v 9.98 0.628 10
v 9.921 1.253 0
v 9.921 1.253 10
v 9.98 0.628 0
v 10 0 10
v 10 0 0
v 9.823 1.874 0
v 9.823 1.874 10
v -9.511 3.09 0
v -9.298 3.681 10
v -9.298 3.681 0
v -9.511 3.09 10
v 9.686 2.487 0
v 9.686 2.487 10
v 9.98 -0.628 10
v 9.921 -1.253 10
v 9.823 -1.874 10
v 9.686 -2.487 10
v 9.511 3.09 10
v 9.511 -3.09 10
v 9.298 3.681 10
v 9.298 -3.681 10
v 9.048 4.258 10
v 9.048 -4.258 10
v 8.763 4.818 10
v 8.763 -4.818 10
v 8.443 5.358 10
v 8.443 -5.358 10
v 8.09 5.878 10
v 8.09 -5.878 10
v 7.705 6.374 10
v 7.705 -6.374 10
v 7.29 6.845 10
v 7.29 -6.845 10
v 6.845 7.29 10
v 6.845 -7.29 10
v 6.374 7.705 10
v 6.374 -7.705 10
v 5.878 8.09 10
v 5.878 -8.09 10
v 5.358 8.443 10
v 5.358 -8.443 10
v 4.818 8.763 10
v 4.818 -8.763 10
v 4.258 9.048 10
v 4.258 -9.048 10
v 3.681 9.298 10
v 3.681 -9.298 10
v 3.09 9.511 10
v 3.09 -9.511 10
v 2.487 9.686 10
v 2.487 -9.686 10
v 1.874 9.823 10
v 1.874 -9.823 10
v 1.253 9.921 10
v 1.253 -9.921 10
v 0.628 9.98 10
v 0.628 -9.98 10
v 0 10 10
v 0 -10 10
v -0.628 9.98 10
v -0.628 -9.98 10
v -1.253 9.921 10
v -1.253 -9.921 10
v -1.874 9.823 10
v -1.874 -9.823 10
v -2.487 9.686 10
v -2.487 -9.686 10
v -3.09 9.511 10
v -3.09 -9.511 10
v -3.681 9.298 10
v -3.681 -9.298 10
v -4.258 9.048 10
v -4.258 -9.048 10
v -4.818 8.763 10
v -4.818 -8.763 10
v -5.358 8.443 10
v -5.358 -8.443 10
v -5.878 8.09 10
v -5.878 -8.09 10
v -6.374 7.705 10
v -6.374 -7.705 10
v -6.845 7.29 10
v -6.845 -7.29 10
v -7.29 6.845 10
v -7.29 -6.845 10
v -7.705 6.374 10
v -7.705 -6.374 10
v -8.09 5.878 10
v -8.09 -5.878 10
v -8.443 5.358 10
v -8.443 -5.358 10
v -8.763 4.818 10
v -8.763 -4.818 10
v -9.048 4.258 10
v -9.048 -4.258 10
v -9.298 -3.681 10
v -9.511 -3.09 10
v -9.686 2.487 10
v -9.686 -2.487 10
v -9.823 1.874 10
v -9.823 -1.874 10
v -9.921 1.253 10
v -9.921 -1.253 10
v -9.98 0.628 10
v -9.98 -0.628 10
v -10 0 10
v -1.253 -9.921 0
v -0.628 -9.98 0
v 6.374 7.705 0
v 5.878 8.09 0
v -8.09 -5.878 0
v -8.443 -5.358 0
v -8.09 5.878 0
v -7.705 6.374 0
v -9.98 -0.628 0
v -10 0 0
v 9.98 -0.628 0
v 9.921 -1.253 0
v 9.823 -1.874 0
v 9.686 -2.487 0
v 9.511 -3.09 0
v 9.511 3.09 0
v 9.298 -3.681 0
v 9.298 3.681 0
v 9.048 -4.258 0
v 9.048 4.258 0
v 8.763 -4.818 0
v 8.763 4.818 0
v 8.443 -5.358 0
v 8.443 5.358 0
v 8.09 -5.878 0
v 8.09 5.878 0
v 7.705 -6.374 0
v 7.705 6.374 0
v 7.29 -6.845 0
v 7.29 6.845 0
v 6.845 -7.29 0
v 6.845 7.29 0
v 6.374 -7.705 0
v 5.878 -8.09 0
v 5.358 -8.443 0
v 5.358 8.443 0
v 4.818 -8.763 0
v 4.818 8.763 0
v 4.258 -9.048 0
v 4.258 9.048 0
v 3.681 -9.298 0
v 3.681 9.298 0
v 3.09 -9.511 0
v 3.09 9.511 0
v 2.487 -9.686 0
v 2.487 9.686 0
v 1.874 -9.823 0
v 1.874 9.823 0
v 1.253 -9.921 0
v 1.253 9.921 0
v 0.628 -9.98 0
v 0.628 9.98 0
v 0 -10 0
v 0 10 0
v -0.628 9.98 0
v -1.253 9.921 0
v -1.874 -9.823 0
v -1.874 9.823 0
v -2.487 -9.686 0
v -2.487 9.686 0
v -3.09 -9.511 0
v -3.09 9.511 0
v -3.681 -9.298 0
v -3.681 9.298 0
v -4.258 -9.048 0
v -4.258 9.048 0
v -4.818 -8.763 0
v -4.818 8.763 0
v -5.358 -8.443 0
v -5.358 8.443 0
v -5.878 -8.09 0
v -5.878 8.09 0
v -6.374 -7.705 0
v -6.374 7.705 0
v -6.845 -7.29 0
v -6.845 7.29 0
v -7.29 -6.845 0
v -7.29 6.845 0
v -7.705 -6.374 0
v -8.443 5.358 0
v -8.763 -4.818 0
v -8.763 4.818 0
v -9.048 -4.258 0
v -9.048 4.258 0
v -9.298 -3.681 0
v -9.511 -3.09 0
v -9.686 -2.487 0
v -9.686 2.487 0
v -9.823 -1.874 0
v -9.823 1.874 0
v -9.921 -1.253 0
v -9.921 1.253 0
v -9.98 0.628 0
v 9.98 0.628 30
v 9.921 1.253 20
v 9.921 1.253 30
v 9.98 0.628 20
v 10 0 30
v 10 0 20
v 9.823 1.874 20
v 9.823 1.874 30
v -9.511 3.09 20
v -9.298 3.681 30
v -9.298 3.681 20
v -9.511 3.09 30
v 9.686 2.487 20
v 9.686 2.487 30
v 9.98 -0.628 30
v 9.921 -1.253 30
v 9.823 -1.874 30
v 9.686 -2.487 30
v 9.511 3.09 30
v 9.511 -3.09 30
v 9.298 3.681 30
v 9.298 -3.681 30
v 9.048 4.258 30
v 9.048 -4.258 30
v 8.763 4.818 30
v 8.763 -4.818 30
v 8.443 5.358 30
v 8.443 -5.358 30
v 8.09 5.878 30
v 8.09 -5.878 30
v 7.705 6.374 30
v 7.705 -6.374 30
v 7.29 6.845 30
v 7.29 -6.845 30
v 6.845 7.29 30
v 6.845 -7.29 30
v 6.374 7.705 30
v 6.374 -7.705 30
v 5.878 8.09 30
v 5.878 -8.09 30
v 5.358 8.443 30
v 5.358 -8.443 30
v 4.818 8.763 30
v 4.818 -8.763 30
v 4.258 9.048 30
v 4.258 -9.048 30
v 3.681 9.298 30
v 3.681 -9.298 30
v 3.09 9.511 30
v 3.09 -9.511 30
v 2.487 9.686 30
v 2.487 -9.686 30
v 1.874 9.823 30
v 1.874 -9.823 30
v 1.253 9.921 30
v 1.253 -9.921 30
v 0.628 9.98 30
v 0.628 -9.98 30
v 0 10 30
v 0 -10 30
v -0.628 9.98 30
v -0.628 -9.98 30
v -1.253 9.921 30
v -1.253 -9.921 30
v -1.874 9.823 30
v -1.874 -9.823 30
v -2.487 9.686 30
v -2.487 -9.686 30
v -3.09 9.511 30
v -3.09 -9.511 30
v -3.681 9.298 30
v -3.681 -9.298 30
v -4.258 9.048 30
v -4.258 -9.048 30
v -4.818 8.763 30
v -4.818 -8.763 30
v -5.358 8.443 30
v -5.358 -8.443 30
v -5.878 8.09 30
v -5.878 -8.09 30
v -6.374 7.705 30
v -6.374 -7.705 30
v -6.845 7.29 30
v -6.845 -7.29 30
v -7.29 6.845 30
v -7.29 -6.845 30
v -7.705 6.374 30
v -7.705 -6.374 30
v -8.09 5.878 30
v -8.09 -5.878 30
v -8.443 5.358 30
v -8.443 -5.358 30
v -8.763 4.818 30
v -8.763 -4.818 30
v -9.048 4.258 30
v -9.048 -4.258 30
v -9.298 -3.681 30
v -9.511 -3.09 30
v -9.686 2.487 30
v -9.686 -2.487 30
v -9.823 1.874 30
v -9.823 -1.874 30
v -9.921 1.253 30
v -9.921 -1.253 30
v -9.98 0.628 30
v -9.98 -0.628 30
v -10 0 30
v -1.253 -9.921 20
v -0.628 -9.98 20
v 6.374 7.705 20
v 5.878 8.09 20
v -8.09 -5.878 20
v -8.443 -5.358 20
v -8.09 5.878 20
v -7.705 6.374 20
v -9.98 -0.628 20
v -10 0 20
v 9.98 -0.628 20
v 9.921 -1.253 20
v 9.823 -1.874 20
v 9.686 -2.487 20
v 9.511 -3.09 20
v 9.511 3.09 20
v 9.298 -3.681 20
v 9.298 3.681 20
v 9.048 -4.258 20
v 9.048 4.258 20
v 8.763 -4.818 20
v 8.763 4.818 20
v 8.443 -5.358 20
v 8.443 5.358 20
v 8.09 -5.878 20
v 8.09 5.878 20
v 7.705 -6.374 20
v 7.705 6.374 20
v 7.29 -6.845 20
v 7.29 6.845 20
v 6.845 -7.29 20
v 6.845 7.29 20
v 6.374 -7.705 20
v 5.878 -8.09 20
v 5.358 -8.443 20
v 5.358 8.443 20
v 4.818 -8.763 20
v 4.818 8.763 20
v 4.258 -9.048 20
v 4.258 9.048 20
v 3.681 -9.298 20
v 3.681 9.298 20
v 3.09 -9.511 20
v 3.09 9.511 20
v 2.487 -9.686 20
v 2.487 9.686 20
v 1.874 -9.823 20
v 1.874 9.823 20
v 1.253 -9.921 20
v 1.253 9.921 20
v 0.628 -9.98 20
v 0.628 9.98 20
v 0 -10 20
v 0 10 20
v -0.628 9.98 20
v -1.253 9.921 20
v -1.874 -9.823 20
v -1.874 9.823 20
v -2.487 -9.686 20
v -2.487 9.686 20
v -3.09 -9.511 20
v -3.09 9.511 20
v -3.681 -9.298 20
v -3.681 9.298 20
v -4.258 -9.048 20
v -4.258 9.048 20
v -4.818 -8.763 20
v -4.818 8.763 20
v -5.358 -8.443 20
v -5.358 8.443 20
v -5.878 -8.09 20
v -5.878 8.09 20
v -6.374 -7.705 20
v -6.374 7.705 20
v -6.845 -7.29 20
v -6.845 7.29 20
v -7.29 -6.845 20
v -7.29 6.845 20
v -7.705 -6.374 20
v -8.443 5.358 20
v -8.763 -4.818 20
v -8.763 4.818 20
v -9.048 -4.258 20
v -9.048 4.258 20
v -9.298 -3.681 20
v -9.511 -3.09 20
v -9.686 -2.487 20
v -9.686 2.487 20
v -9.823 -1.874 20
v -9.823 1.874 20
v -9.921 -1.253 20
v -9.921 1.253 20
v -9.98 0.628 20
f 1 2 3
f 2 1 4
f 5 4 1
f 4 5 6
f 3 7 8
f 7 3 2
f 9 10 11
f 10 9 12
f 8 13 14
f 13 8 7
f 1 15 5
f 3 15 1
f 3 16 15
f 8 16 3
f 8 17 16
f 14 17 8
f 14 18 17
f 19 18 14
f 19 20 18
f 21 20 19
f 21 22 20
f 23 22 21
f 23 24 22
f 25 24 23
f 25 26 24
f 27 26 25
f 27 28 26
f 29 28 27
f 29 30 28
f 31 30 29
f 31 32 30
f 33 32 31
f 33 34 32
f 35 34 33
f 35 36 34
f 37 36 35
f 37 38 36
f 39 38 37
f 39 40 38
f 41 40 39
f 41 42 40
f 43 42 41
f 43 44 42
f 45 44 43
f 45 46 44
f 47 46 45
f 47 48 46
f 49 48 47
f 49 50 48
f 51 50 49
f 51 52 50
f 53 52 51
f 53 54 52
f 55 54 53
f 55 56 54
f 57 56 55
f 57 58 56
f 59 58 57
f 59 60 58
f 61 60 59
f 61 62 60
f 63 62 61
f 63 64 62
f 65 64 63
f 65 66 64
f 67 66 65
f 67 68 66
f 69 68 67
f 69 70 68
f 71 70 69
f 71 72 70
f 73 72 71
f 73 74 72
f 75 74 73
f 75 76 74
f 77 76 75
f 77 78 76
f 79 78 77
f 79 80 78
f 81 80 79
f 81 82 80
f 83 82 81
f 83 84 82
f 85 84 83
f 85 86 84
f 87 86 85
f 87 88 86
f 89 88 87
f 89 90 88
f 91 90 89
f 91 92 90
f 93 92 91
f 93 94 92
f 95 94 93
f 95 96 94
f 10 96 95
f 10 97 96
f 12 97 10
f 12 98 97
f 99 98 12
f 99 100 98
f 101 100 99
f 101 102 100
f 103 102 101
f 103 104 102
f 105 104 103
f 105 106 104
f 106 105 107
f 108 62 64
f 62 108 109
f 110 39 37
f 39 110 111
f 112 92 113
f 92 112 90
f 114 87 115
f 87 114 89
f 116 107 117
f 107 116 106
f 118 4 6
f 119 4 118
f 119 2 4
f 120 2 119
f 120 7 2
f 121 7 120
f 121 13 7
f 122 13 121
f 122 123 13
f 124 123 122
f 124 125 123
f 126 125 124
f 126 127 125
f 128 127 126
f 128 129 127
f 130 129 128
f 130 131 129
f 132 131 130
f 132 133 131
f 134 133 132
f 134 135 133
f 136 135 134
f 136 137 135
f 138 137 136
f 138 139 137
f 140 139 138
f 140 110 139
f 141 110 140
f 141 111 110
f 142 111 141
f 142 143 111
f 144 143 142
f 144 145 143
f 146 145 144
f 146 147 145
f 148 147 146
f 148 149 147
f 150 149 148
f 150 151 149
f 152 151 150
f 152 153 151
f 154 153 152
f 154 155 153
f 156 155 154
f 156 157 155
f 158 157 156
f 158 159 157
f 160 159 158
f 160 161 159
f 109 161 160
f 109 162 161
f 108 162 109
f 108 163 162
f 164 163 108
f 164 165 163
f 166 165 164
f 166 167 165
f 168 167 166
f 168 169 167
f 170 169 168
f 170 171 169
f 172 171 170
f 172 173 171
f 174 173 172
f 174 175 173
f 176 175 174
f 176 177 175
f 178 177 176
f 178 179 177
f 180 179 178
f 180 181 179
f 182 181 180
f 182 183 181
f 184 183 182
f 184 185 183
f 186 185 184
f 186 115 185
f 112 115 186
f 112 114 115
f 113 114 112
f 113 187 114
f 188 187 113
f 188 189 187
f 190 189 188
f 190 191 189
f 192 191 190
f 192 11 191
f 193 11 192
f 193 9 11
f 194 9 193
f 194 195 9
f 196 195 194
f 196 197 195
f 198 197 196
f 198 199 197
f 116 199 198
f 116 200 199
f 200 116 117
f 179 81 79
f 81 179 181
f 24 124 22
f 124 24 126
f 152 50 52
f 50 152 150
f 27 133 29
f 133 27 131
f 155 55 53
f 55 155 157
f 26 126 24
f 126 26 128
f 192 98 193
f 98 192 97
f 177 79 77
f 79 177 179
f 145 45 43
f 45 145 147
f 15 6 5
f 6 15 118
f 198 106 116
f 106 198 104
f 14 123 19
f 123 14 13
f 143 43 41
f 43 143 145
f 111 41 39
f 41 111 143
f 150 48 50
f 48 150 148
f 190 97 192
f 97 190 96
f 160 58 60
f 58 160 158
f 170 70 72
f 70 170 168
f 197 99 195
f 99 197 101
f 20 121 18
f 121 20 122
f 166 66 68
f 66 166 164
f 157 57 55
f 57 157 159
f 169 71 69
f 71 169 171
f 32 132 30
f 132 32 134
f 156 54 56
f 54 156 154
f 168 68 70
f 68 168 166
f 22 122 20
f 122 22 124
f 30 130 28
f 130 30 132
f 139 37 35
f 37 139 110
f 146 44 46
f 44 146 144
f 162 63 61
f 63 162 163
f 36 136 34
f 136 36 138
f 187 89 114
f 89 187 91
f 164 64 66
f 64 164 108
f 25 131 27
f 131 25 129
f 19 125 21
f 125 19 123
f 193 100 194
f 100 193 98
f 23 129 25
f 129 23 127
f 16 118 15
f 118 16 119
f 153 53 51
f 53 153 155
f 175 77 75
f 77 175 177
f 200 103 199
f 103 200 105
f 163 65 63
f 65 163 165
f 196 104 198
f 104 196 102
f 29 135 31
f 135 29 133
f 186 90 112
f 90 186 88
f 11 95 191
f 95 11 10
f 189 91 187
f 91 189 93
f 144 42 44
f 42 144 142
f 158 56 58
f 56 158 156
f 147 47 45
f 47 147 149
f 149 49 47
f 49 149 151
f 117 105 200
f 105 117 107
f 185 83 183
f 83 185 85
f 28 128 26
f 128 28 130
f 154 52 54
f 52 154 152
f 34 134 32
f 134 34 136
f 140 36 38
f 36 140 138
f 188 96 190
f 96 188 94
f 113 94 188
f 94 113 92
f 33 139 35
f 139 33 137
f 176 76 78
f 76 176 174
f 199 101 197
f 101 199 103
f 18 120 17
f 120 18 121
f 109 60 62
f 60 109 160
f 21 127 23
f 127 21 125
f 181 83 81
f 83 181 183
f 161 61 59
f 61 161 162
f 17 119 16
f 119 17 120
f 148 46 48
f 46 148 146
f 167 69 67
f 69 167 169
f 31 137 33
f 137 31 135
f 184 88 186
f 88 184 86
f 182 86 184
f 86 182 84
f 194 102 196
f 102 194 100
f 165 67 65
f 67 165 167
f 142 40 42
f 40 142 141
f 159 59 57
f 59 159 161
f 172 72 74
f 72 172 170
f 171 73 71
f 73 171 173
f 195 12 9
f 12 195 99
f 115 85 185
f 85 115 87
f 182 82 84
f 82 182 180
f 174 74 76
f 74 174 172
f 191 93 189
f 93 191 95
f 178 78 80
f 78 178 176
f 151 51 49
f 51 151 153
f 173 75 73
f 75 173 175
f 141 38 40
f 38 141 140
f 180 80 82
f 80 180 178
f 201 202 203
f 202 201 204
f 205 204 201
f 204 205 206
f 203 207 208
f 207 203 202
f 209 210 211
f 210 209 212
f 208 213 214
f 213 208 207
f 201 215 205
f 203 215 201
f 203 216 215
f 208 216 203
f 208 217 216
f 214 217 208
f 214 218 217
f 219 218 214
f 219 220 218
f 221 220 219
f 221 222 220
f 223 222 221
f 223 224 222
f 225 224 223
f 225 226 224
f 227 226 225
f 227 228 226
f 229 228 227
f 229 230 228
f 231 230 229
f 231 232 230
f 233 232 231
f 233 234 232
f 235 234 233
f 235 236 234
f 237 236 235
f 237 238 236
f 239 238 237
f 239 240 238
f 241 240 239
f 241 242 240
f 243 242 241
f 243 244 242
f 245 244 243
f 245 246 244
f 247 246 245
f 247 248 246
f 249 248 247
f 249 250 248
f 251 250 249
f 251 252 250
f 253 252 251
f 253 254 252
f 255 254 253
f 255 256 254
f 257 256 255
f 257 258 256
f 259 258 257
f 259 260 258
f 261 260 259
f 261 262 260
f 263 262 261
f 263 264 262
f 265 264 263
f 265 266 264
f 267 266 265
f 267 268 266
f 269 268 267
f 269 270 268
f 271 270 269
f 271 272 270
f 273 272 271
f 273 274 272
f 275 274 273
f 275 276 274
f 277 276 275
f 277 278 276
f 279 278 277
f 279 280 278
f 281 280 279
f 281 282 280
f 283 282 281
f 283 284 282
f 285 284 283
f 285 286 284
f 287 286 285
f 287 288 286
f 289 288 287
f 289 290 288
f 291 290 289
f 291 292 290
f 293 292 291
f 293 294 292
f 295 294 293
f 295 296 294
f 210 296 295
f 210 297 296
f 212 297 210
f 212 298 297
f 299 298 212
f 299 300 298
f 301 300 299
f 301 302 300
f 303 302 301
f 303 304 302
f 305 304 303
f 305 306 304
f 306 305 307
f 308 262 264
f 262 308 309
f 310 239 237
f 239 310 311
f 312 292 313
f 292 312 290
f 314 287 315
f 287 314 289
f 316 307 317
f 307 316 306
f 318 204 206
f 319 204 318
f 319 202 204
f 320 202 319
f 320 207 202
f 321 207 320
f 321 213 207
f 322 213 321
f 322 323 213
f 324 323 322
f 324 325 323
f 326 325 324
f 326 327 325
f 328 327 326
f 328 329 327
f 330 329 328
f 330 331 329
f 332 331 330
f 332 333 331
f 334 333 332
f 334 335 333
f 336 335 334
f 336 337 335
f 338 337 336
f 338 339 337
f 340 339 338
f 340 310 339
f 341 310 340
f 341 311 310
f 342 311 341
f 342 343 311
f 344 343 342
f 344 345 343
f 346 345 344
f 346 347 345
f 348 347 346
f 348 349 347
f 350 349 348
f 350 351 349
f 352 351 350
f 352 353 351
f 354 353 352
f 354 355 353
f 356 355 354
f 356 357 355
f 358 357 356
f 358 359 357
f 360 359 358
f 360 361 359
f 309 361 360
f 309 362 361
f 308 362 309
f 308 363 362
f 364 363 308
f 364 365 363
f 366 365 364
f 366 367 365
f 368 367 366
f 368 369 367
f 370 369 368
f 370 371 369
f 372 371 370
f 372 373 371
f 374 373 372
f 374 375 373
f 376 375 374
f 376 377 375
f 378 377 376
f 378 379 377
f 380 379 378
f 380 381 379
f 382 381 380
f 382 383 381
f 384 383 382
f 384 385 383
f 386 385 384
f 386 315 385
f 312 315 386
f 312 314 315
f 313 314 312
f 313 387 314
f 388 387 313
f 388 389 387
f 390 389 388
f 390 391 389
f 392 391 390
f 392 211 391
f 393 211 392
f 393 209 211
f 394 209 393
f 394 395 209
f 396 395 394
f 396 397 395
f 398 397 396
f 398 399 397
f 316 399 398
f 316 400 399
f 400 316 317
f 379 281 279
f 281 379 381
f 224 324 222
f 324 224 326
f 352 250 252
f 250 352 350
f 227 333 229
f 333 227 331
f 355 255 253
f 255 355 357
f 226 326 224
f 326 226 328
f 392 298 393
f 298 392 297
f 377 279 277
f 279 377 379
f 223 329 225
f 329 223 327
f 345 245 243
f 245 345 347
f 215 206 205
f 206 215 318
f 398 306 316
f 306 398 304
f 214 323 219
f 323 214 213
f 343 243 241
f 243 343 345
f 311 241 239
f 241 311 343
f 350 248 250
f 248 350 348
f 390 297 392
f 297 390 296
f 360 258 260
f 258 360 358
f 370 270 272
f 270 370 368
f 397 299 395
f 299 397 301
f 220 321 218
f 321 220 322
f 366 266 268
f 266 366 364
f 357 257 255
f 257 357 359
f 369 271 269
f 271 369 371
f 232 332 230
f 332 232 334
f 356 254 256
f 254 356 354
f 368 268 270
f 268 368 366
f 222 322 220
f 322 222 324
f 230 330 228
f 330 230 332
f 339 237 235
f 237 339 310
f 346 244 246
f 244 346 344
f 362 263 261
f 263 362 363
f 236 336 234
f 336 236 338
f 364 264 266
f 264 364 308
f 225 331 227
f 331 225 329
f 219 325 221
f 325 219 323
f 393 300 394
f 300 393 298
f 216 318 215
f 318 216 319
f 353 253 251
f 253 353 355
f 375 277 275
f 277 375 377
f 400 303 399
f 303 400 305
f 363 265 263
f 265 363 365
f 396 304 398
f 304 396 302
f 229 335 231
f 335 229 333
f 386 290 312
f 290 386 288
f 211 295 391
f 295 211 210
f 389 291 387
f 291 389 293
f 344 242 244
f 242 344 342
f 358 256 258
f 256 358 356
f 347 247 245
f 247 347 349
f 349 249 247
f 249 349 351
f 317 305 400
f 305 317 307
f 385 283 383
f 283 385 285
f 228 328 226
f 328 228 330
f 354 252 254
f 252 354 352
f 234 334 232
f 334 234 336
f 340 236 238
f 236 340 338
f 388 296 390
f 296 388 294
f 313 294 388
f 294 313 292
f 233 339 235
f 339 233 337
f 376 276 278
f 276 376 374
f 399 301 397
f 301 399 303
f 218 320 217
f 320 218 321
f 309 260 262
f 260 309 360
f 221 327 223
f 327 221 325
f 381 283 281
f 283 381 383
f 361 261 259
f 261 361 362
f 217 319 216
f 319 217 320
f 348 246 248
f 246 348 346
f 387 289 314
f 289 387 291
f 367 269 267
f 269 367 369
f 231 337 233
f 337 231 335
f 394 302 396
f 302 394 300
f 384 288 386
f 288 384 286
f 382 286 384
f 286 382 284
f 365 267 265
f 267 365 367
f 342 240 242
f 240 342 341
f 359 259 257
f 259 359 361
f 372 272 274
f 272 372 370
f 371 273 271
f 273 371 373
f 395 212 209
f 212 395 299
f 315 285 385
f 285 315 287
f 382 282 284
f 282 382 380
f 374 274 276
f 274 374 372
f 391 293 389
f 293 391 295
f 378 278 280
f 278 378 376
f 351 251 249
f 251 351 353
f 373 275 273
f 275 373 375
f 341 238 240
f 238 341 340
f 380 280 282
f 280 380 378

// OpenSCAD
d1=35;
d2=30;
h1=30;

d3=34;
d4=39;
h2=33;


w_support=10;

$fn=100;


module support_piece(d=20){
    
    }

module support_block(d=20, h=100, w=w_support){
    translate([0,0,(h%w)/2])for(a=[0:w:h-w]){
        if((a/w)%2==0){
            translate([0,0,a])cylinder(r=d/2, h=w);
        }
        }
    }

//module inner(){
//    cylinder(r1=d4/2, r2=d1/2, h=(h2-h1)/2, $fn=100);
//    
//    }

//inner();
support_block(h=40);
//echo(33%10);
